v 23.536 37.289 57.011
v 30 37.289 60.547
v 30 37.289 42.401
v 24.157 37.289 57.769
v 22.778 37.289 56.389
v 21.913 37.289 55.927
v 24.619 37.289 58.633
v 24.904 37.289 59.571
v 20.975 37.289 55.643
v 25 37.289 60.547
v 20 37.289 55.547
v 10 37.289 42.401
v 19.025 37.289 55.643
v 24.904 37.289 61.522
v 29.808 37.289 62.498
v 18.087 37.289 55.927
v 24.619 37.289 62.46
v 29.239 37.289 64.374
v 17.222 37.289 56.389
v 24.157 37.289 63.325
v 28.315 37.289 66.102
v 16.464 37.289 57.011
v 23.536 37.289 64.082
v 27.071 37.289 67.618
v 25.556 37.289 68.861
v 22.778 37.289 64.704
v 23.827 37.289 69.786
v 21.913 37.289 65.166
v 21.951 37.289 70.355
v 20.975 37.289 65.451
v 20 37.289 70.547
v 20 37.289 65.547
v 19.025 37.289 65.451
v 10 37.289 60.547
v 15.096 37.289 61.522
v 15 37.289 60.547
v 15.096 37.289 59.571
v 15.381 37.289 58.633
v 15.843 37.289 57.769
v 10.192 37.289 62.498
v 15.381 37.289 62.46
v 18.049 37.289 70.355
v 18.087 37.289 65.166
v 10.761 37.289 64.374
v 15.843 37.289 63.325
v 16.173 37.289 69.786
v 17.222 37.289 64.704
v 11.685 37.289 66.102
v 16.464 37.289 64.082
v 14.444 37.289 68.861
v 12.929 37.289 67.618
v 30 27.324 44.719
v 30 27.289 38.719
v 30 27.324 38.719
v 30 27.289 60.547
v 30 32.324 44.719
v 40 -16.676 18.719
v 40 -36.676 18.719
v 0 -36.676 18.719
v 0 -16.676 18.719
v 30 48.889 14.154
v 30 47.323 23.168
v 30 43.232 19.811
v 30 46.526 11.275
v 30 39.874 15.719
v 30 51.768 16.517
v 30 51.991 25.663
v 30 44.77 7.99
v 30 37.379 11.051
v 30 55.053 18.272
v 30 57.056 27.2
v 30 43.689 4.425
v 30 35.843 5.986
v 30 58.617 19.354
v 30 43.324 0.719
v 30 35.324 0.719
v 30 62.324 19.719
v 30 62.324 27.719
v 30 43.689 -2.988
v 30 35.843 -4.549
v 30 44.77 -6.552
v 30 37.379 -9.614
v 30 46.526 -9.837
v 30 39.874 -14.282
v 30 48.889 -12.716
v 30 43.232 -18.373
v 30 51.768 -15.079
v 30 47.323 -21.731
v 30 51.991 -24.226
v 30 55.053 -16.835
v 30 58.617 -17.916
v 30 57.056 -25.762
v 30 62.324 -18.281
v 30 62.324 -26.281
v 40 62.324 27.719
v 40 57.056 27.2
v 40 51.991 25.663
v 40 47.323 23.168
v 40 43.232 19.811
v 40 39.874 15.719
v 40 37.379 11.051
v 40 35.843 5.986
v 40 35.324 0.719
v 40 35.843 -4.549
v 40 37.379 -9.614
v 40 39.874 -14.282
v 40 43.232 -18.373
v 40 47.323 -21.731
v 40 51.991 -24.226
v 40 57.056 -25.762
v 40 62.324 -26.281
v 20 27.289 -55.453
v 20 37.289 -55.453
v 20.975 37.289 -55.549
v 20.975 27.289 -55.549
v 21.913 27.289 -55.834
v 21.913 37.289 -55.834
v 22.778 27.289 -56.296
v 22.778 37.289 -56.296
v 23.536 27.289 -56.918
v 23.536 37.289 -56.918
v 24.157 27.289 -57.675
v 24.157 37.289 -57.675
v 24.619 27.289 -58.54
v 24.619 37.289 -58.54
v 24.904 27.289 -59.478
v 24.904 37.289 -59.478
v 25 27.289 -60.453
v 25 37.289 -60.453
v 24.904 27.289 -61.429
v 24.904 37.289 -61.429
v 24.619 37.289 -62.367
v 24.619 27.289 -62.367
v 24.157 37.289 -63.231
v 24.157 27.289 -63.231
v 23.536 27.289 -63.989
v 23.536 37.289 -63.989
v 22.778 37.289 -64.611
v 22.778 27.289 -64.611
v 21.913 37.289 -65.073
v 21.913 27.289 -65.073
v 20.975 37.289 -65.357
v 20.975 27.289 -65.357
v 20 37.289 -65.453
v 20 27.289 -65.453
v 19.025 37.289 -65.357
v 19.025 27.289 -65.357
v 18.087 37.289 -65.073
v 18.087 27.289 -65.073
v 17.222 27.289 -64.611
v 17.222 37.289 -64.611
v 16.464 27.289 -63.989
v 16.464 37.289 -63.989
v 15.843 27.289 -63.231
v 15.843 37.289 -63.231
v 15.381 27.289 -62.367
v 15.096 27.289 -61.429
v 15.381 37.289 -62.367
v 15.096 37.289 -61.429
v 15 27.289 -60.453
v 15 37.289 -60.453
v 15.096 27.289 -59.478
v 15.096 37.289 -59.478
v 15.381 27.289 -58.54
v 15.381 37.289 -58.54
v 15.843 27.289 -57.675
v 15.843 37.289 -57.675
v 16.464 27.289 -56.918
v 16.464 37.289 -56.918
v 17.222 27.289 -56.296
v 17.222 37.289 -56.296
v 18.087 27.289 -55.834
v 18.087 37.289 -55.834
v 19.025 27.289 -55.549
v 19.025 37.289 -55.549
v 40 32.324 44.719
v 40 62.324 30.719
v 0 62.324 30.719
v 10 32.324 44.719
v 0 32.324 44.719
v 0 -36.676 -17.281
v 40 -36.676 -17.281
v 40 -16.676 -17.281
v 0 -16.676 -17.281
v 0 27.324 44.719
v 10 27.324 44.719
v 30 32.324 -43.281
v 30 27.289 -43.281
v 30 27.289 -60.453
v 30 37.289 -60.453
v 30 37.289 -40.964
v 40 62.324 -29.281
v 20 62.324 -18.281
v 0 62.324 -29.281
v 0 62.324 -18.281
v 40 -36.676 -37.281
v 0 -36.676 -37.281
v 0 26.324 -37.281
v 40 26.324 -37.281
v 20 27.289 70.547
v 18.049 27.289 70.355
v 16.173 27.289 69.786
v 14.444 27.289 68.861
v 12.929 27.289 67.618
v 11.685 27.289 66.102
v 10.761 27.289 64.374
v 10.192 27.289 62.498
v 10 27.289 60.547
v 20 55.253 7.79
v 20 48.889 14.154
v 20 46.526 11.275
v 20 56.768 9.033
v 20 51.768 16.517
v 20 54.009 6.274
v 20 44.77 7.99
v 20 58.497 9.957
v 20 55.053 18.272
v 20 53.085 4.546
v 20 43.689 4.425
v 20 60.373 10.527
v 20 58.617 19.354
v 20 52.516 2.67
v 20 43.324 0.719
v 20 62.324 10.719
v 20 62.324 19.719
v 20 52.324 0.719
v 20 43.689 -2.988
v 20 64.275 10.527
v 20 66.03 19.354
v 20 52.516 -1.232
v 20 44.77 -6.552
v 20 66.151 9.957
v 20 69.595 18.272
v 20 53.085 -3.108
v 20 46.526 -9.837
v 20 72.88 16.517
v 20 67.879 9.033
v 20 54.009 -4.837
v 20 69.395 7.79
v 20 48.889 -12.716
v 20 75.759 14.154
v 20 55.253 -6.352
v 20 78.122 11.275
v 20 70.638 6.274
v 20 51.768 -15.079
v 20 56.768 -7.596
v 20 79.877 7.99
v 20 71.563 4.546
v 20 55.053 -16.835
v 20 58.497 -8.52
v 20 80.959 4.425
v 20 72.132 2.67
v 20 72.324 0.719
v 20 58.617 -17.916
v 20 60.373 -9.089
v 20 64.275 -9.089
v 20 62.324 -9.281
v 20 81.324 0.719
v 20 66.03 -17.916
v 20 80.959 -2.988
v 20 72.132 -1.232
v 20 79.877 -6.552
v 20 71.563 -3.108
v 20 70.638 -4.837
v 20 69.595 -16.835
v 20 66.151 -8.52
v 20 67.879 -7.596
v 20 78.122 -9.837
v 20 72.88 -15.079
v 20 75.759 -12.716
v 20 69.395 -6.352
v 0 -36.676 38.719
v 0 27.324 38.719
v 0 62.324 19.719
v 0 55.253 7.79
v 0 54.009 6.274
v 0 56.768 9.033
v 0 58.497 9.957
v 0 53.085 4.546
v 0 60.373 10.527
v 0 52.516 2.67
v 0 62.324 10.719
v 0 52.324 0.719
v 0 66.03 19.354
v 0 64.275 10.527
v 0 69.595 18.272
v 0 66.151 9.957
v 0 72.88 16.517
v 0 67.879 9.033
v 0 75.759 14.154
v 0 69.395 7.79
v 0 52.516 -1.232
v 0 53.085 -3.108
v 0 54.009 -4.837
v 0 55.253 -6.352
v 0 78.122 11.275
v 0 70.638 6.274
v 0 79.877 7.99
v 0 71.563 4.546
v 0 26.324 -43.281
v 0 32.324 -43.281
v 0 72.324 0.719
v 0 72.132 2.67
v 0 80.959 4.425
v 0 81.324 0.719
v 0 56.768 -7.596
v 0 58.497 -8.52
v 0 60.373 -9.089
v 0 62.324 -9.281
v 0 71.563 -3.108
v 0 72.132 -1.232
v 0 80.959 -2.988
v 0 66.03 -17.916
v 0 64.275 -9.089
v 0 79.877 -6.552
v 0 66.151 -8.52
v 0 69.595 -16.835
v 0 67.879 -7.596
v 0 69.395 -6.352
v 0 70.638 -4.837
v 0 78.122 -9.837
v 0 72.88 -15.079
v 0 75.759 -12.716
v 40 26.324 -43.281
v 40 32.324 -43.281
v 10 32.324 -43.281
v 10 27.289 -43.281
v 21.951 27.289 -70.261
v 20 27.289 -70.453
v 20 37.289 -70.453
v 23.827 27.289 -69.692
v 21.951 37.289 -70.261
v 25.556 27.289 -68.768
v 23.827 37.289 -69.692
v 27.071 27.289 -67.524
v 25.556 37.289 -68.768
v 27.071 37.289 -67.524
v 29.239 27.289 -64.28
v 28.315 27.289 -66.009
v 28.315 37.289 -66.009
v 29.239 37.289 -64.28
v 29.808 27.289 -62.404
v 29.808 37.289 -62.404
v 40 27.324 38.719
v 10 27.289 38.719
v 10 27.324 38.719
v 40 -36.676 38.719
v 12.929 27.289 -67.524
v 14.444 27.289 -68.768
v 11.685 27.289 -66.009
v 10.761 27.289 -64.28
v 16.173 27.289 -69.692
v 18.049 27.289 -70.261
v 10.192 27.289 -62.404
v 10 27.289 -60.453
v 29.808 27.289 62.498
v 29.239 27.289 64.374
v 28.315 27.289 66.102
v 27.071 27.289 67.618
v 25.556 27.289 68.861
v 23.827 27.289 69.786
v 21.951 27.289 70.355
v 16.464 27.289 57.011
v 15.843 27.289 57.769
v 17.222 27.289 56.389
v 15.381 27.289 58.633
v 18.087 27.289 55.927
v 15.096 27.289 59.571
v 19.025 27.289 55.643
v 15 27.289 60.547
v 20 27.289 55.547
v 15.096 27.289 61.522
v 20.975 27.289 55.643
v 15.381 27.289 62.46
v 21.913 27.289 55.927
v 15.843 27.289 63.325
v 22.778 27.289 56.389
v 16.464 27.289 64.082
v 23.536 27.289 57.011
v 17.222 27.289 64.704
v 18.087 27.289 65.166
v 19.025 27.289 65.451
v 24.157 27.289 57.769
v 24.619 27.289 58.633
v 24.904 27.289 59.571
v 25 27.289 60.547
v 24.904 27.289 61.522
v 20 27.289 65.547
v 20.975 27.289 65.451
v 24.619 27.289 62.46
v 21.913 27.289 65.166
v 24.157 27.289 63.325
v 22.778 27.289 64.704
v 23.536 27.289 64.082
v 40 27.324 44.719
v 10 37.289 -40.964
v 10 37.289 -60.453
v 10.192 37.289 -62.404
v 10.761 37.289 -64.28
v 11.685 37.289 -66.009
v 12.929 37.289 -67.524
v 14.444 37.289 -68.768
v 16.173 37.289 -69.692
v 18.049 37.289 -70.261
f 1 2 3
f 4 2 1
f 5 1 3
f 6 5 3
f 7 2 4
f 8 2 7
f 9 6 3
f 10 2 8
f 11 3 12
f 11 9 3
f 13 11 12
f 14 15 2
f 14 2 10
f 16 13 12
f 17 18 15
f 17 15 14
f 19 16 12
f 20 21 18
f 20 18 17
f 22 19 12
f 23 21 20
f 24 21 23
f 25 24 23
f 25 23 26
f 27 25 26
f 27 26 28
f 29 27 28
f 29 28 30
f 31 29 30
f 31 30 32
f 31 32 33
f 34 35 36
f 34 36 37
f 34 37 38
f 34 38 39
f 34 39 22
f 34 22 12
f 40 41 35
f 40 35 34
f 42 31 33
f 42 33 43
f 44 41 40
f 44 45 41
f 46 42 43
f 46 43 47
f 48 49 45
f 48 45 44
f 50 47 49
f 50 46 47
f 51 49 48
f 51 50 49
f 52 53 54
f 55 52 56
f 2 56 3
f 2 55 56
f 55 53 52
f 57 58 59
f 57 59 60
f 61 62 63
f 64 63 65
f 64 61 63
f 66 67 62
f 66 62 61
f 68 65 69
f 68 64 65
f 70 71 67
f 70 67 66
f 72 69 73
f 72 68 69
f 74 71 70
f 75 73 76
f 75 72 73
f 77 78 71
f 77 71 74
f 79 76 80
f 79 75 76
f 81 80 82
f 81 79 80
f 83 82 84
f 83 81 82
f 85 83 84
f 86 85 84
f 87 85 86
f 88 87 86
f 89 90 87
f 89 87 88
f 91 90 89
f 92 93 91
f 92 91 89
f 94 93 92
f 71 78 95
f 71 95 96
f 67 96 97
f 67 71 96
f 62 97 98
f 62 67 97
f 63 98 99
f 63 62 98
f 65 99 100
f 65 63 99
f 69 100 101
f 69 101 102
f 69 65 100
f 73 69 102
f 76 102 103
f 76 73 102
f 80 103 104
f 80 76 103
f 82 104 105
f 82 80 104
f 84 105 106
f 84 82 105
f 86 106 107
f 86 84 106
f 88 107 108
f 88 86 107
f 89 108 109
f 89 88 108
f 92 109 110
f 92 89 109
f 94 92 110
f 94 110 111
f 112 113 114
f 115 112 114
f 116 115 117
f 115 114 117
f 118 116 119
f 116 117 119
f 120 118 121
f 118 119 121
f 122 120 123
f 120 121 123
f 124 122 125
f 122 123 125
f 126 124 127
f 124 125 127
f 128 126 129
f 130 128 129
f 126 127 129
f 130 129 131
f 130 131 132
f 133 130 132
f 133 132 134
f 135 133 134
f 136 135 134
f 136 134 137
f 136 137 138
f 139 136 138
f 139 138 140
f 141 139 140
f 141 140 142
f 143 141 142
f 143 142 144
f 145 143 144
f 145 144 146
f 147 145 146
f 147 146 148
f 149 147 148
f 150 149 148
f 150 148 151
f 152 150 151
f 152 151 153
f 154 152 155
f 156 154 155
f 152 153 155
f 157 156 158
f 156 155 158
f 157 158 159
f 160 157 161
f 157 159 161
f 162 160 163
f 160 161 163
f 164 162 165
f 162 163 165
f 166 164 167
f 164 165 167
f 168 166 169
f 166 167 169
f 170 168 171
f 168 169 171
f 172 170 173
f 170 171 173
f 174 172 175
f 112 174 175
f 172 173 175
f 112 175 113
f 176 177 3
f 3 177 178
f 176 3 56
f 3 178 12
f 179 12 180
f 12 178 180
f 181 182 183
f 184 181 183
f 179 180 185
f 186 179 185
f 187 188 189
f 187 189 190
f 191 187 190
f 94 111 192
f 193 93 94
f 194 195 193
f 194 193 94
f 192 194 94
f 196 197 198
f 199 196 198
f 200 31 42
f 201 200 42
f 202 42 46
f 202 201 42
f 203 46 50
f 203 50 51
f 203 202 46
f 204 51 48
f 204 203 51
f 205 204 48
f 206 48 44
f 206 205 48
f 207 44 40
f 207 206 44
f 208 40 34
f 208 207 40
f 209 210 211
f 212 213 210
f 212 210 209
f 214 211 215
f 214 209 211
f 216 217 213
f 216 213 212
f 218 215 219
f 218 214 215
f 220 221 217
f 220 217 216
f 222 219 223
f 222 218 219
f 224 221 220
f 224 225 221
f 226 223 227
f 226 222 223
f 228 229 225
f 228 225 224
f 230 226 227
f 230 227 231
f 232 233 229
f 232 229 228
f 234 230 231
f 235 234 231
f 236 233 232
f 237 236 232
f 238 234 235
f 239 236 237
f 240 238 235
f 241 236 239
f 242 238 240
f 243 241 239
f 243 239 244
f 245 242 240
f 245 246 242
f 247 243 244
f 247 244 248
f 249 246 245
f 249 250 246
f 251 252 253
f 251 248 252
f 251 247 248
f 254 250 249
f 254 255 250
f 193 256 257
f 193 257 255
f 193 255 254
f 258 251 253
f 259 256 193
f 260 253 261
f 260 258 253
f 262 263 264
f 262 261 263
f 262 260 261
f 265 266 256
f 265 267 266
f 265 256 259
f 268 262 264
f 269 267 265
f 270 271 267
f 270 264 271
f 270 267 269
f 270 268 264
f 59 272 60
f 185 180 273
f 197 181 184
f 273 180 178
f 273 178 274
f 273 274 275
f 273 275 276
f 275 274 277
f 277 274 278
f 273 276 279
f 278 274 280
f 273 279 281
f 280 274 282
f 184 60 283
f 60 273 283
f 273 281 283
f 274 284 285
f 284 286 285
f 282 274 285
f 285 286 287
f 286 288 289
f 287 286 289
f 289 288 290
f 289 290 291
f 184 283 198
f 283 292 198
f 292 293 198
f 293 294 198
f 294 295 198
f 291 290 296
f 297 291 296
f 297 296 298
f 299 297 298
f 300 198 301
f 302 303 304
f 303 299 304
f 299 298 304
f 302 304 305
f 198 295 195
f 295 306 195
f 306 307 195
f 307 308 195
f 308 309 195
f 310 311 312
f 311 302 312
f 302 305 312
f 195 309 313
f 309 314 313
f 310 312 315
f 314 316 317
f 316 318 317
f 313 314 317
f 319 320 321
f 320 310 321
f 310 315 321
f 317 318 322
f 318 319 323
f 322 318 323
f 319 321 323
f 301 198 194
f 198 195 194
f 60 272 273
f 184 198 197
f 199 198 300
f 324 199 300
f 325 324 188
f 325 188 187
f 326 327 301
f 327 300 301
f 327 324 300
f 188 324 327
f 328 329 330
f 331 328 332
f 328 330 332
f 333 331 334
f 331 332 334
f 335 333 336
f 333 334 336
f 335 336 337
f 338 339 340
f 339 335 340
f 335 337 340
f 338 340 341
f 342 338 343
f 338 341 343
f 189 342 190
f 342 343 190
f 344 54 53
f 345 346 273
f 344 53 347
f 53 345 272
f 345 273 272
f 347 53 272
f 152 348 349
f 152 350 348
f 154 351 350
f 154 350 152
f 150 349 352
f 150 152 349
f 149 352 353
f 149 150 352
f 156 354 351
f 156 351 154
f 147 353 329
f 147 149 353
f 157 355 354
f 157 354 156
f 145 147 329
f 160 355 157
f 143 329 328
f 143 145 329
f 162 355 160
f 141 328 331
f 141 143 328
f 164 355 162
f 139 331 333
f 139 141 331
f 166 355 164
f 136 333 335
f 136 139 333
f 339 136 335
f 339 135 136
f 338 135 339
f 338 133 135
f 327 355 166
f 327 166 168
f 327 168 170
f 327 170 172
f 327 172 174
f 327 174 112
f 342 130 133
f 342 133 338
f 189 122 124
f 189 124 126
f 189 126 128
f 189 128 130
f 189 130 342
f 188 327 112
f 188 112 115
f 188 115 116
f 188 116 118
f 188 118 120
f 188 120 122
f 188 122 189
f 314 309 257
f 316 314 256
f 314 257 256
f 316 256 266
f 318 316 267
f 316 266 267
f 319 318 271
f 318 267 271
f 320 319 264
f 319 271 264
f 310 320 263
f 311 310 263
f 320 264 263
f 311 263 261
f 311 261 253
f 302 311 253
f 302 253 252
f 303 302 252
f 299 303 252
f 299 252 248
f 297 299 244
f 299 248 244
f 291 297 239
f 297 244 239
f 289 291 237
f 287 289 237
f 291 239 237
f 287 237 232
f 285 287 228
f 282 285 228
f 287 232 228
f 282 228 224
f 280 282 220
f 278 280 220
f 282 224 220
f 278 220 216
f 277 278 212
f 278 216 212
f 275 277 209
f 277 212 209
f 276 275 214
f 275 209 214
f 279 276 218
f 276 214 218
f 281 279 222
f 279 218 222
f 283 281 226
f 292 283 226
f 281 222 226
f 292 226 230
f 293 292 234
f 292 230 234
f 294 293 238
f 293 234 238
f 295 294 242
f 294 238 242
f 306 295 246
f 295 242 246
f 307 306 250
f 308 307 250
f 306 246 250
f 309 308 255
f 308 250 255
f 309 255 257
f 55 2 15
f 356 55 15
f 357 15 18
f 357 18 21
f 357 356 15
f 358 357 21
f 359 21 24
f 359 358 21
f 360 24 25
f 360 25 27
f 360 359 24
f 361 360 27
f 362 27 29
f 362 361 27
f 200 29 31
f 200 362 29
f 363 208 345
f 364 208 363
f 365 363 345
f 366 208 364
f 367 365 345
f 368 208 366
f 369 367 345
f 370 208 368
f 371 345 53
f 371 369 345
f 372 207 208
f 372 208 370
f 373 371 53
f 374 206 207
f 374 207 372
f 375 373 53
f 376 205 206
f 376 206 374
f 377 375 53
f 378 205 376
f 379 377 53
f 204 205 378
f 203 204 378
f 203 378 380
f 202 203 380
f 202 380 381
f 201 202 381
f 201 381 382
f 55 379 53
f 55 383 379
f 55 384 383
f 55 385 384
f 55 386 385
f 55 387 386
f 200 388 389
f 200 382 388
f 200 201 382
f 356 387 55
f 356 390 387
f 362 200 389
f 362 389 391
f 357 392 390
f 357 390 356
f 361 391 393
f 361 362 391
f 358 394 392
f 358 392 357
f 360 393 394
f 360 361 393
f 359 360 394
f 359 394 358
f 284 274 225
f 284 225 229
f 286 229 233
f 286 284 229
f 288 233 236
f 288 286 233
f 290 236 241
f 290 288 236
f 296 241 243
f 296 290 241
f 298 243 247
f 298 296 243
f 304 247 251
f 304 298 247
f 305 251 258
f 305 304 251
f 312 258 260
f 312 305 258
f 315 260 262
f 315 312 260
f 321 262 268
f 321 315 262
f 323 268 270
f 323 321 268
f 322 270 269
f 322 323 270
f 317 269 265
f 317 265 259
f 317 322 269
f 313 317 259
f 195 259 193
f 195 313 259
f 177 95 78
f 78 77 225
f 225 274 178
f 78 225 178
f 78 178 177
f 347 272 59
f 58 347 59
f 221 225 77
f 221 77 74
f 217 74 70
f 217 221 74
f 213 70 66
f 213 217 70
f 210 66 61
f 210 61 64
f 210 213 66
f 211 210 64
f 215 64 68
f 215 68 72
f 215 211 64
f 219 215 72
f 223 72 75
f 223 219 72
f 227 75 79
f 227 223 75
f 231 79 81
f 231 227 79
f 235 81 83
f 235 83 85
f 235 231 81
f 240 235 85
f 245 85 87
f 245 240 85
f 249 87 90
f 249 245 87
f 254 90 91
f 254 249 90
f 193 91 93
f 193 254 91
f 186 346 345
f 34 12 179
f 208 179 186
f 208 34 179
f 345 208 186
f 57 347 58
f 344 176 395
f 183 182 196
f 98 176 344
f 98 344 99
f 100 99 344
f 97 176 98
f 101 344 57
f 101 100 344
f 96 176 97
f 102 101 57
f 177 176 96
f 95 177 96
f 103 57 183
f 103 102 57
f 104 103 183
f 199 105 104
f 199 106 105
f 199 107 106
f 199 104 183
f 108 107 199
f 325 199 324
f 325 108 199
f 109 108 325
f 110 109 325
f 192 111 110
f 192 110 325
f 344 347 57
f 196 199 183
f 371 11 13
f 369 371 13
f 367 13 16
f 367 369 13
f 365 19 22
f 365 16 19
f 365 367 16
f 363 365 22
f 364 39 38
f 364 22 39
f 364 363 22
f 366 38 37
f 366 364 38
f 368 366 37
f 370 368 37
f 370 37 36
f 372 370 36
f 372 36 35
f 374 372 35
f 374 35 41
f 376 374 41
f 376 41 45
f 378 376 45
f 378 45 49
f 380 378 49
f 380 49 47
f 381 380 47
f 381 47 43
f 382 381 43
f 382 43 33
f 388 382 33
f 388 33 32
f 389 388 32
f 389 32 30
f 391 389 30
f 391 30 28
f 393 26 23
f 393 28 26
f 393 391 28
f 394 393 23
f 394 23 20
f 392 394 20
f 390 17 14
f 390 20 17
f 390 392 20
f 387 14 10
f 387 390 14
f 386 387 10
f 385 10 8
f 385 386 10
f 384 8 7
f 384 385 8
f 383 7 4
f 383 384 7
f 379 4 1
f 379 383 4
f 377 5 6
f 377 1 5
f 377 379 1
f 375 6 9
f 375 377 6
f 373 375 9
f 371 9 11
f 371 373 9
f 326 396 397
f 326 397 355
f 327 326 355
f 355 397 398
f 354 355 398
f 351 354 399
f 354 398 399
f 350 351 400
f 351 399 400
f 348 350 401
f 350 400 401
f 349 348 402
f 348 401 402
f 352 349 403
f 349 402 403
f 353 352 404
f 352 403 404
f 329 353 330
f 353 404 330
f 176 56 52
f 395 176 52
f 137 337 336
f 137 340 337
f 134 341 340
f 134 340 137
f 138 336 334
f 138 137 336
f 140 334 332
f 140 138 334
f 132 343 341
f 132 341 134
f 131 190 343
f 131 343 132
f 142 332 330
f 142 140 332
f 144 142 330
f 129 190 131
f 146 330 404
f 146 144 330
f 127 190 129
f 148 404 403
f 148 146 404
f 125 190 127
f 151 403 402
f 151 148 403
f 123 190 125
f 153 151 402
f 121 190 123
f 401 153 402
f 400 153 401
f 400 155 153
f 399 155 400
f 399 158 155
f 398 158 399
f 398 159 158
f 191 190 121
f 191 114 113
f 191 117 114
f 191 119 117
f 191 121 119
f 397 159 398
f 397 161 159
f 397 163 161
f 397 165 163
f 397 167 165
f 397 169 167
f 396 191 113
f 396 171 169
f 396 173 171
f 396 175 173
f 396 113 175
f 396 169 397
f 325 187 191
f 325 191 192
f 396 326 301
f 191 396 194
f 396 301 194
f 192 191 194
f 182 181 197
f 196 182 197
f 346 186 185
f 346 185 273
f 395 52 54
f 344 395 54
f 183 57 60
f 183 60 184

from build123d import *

# Parameters (mm, degrees)
BOSS_EXTRUDE1_DEPTH      = 40
BOSS_EXTRUDE2_DEPTH      = 110
BOSS_EXTRUDE2_DEPTH_BACK = 31
SKETCH11_R               = 5
CUT_EXTRUDE11_DEPTH      = 30
SKETCH12_R               = 5
CUT_EXTRUDE15_DEPTH      = 84
SKETCH5_W                = 36
SKETCH5_H                = 20
CUT_EXTRUDE3_DEPTH       = 43
BOSS_EXTRUDE6_DEPTH      = 40
CUT_EXTRUDE4_START       = -10
SKETCH6_R                = 27
CUT_EXTRUDE4_DEPTH       = 10
CUT_EXTRUDE7_START       = -10
CUT_EXTRUDE7_DEPTH       = 10
CUT_EXTRUDE8_START       = -20
CUT_EXTRUDE8_DEPTH       = 20
SKETCH10_R               = 10
CUT_EXTRUDE9_DEPTH       = 20


# Read off the part's stored shape, not the designer's step: Boss-Extrude6
with BuildPart() as part:
    # Sketch1 → Boss-Extrude1 (new body)
    with BuildSketch(Plane(origin=(0, 0, 0), x_dir=(0, 0, -1), z_dir=(1, 0, 0))):
        Polygon((-38.7187028, -36.676276186), (37.2812972, -36.676276186), (37.2812972, 26.323723814), (43.2812972, 26.323723814), (43.2812972, 32.323723814), (29.2812972, 62.323723814), (-30.7187028, 62.323723814), (-44.7187028, 32.323723814), (-44.7187028, 27.323723814), (-38.7187028, 27.323723814), align=None)
    extrude(amount=BOSS_EXTRUDE1_DEPTH)

    # 3DSketch1 → Boss-Extrude2 (add, two sides: drawn at the far end of the back side and taken through both)
    with BuildSketch(Plane(origin=(30, 37.289381844, 39.546748703), x_dir=(-0.8944271909999159, -0.44721359549995804, 0), z_dir=(0, 0, -1)).offset(-BOSS_EXTRUDE2_DEPTH_BACK)):
        Polygon((0, 0), (17.88854382, 8.94427191), (22.360679775, 0), (4.472135955, -8.94427191), align=None)
    extrude(amount=BOSS_EXTRUDE2_DEPTH + BOSS_EXTRUDE2_DEPTH_BACK)

    # Sketch11 → Cut-Extrude11 (cut)
    with BuildSketch(Plane(origin=(0, 37.289381844, 0), x_dir=(1, 0, 0), z_dir=(0, 1, 0))):
        with BuildLine():
            Line((20, 70.453251297), (10, 70.453251297))
            Line((10, 70.453251297), (10, 60.453251297))
            ThreePointArc((10, 60.453251297), (12.928932188, 67.524319109), (20, 70.453251297))
        make_face()
        with BuildLine():
            Line((30, 70.453251297), (20, 70.453251297))
            ThreePointArc((20, 70.453251297), (27.071067812, 67.524319109), (30, 60.453251297))
            Line((30, 60.453251297), (30, 70.453251297))
        make_face()
        with Locations(Location((20, 60.453251297, 0), (0, 0, 270))):
            Circle(SKETCH11_R)
    extrude(amount=-CUT_EXTRUDE11_DEPTH, mode=Mode.SUBTRACT)

    # Sketch12 → Cut-Extrude15 (cut)
    with BuildSketch(Plane(origin=(0, 0, 0), x_dir=(1, 0, 0), z_dir=(0, 1, 0))):
        with BuildLine():
            Line((10, -70.546748703), (20, -70.546748703))
            ThreePointArc((20, -70.546748703), (12.928932188, -67.617816515), (10, -60.546748703))
            Line((10, -60.546748703), (10, -70.546748703))
        make_face()
        with BuildLine():
            Line((20, -70.546748703), (30, -70.546748703))
            Line((30, -70.546748703), (30, -60.546748703))
            ThreePointArc((30, -60.546748703), (27.071067812, -67.617816515), (20, -70.546748703))
        make_face()
        with Locations(Location((20, -60.546748703, 0), (0, 0, 90))):
            Circle(SKETCH12_R)
    extrude(amount=CUT_EXTRUDE15_DEPTH, mode=Mode.SUBTRACT)

    # Sketch5 → Cut-Extrude3 (cut)
    with BuildSketch(Plane(origin=(40, 0, 0), x_dir=(0, 0, -1), z_dir=(1, 0, 0))):
        with Locations((-0.7187028, -26.676276186)):
            Rectangle(SKETCH5_W, SKETCH5_H)
    extrude(amount=-CUT_EXTRUDE3_DEPTH, mode=Mode.SUBTRACT)

    # Boss-Extrude6 outline → Boss-Extrude6 (add)
    with BuildSketch(Plane.YZ):
        with BuildLine():
            ThreePointArc((62.323723814, -26.2812972), (89.323723814, 0.7187028), (62.323723814, 27.7187028))
            Line((62.323723814, 27.7187028), (62.323723814, -26.2812972))
        make_face()
    extrude(amount=BOSS_EXTRUDE6_DEPTH)

    # Sketch6 → Cut-Extrude4 (cut)
    with BuildSketch(Plane(origin=(40, 0, 0), x_dir=(0, 0, -1), z_dir=(1, 0, 0)).offset(CUT_EXTRUDE4_START)):
        with Locations((-0.7187028, 62.323723814)):
            Circle(SKETCH6_R)
    extrude(amount=CUT_EXTRUDE4_DEPTH, mode=Mode.SUBTRACT)

    # Sketch8 → Cut-Extrude7 (cut)
    with BuildSketch(Plane(origin=(30, 0, 0), x_dir=(0, 0, -1), z_dir=(1, 0, 0)).offset(CUT_EXTRUDE7_START)):
        with BuildLine():
            Line((-27.7187028, 62.323723814), (-19.7187028, 62.323723814))
            ThreePointArc((-19.7187028, 62.323723814), (-0.7187028, 43.323723814), (18.2812972, 62.323723814))
            Line((18.2812972, 62.323723814), (26.2812972, 62.323723814))
            ThreePointArc((26.2812972, 62.323723814), (-0.7187028, 89.323723814), (-27.7187028, 62.323723814))
        make_face()
    extrude(amount=CUT_EXTRUDE7_DEPTH, mode=Mode.SUBTRACT)

    # Sketch9 → Cut-Extrude8 (cut)
    with BuildSketch(Plane(origin=(20, 0, 0), x_dir=(0, 0, -1), z_dir=(1, 0, 0)).offset(CUT_EXTRUDE8_START)):
        with BuildLine():
            Line((-27.7187028, 62.323723814), (-19.7187028, 62.323723814))
            ThreePointArc((-19.7187028, 62.323723814), (-0.7187028, 81.323723814), (18.2812972, 62.323723814))
            Line((18.2812972, 62.323723814), (26.2812972, 62.323723814))
            ThreePointArc((26.2812972, 62.323723814), (-0.7187028, 89.323723814), (-27.7187028, 62.323723814))
        make_face()
    extrude(amount=CUT_EXTRUDE8_DEPTH, mode=Mode.SUBTRACT)

    # Sketch10 → Cut-Extrude9 (cut)
    with BuildSketch(Plane(origin=(20, 0, 0), x_dir=(0, 0, -1), z_dir=(1, 0, 0))):
        with Locations((-0.7187028, 62.323723814)):
            Circle(SKETCH10_R)
    extrude(amount=-CUT_EXTRUDE9_DEPTH, mode=Mode.SUBTRACT)


solid = part.part
